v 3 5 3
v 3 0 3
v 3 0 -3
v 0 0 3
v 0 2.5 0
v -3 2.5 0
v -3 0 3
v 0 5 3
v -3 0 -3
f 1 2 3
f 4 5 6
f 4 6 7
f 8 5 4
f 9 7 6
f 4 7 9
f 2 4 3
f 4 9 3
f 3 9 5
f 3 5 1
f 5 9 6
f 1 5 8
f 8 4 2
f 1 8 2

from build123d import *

# Parameters (mm, degrees)
SKETCH1_W           = 6
SKETCH1_H           = 6
BOSS_EXTRUDE1_DEPTH = 5
CUT_EXTRUDE9_DEPTH  = 23.5
CUT_EXTRUDE10_DEPTH = 3


with BuildPart() as part:
    # Sketch1 → Boss-Extrude1 (new body)
    with BuildSketch(Plane(origin=(0, 0, 0), x_dir=(1, 0, 0), z_dir=(0, 1, 0))):
        Rectangle(SKETCH1_W, SKETCH1_H)
    extrude(amount=BOSS_EXTRUDE1_DEPTH)

    # Sketch12 → Cut-Extrude9 (cut)
    with BuildSketch(Plane.ZY.offset(3)):
        Polygon((-3, 5), (-3, 0), (3, 5), align=None)
    extrude(amount=-CUT_EXTRUDE9_DEPTH, mode=Mode.SUBTRACT)

    # Sketch13 → Cut-Extrude10 (cut)
    with BuildSketch(Plane.ZY.offset(3)):
        Polygon((3, 5), (0, 2.5), (3, 0), align=None)
    extrude(amount=-CUT_EXTRUDE10_DEPTH, mode=Mode.SUBTRACT)


solid = part.part
